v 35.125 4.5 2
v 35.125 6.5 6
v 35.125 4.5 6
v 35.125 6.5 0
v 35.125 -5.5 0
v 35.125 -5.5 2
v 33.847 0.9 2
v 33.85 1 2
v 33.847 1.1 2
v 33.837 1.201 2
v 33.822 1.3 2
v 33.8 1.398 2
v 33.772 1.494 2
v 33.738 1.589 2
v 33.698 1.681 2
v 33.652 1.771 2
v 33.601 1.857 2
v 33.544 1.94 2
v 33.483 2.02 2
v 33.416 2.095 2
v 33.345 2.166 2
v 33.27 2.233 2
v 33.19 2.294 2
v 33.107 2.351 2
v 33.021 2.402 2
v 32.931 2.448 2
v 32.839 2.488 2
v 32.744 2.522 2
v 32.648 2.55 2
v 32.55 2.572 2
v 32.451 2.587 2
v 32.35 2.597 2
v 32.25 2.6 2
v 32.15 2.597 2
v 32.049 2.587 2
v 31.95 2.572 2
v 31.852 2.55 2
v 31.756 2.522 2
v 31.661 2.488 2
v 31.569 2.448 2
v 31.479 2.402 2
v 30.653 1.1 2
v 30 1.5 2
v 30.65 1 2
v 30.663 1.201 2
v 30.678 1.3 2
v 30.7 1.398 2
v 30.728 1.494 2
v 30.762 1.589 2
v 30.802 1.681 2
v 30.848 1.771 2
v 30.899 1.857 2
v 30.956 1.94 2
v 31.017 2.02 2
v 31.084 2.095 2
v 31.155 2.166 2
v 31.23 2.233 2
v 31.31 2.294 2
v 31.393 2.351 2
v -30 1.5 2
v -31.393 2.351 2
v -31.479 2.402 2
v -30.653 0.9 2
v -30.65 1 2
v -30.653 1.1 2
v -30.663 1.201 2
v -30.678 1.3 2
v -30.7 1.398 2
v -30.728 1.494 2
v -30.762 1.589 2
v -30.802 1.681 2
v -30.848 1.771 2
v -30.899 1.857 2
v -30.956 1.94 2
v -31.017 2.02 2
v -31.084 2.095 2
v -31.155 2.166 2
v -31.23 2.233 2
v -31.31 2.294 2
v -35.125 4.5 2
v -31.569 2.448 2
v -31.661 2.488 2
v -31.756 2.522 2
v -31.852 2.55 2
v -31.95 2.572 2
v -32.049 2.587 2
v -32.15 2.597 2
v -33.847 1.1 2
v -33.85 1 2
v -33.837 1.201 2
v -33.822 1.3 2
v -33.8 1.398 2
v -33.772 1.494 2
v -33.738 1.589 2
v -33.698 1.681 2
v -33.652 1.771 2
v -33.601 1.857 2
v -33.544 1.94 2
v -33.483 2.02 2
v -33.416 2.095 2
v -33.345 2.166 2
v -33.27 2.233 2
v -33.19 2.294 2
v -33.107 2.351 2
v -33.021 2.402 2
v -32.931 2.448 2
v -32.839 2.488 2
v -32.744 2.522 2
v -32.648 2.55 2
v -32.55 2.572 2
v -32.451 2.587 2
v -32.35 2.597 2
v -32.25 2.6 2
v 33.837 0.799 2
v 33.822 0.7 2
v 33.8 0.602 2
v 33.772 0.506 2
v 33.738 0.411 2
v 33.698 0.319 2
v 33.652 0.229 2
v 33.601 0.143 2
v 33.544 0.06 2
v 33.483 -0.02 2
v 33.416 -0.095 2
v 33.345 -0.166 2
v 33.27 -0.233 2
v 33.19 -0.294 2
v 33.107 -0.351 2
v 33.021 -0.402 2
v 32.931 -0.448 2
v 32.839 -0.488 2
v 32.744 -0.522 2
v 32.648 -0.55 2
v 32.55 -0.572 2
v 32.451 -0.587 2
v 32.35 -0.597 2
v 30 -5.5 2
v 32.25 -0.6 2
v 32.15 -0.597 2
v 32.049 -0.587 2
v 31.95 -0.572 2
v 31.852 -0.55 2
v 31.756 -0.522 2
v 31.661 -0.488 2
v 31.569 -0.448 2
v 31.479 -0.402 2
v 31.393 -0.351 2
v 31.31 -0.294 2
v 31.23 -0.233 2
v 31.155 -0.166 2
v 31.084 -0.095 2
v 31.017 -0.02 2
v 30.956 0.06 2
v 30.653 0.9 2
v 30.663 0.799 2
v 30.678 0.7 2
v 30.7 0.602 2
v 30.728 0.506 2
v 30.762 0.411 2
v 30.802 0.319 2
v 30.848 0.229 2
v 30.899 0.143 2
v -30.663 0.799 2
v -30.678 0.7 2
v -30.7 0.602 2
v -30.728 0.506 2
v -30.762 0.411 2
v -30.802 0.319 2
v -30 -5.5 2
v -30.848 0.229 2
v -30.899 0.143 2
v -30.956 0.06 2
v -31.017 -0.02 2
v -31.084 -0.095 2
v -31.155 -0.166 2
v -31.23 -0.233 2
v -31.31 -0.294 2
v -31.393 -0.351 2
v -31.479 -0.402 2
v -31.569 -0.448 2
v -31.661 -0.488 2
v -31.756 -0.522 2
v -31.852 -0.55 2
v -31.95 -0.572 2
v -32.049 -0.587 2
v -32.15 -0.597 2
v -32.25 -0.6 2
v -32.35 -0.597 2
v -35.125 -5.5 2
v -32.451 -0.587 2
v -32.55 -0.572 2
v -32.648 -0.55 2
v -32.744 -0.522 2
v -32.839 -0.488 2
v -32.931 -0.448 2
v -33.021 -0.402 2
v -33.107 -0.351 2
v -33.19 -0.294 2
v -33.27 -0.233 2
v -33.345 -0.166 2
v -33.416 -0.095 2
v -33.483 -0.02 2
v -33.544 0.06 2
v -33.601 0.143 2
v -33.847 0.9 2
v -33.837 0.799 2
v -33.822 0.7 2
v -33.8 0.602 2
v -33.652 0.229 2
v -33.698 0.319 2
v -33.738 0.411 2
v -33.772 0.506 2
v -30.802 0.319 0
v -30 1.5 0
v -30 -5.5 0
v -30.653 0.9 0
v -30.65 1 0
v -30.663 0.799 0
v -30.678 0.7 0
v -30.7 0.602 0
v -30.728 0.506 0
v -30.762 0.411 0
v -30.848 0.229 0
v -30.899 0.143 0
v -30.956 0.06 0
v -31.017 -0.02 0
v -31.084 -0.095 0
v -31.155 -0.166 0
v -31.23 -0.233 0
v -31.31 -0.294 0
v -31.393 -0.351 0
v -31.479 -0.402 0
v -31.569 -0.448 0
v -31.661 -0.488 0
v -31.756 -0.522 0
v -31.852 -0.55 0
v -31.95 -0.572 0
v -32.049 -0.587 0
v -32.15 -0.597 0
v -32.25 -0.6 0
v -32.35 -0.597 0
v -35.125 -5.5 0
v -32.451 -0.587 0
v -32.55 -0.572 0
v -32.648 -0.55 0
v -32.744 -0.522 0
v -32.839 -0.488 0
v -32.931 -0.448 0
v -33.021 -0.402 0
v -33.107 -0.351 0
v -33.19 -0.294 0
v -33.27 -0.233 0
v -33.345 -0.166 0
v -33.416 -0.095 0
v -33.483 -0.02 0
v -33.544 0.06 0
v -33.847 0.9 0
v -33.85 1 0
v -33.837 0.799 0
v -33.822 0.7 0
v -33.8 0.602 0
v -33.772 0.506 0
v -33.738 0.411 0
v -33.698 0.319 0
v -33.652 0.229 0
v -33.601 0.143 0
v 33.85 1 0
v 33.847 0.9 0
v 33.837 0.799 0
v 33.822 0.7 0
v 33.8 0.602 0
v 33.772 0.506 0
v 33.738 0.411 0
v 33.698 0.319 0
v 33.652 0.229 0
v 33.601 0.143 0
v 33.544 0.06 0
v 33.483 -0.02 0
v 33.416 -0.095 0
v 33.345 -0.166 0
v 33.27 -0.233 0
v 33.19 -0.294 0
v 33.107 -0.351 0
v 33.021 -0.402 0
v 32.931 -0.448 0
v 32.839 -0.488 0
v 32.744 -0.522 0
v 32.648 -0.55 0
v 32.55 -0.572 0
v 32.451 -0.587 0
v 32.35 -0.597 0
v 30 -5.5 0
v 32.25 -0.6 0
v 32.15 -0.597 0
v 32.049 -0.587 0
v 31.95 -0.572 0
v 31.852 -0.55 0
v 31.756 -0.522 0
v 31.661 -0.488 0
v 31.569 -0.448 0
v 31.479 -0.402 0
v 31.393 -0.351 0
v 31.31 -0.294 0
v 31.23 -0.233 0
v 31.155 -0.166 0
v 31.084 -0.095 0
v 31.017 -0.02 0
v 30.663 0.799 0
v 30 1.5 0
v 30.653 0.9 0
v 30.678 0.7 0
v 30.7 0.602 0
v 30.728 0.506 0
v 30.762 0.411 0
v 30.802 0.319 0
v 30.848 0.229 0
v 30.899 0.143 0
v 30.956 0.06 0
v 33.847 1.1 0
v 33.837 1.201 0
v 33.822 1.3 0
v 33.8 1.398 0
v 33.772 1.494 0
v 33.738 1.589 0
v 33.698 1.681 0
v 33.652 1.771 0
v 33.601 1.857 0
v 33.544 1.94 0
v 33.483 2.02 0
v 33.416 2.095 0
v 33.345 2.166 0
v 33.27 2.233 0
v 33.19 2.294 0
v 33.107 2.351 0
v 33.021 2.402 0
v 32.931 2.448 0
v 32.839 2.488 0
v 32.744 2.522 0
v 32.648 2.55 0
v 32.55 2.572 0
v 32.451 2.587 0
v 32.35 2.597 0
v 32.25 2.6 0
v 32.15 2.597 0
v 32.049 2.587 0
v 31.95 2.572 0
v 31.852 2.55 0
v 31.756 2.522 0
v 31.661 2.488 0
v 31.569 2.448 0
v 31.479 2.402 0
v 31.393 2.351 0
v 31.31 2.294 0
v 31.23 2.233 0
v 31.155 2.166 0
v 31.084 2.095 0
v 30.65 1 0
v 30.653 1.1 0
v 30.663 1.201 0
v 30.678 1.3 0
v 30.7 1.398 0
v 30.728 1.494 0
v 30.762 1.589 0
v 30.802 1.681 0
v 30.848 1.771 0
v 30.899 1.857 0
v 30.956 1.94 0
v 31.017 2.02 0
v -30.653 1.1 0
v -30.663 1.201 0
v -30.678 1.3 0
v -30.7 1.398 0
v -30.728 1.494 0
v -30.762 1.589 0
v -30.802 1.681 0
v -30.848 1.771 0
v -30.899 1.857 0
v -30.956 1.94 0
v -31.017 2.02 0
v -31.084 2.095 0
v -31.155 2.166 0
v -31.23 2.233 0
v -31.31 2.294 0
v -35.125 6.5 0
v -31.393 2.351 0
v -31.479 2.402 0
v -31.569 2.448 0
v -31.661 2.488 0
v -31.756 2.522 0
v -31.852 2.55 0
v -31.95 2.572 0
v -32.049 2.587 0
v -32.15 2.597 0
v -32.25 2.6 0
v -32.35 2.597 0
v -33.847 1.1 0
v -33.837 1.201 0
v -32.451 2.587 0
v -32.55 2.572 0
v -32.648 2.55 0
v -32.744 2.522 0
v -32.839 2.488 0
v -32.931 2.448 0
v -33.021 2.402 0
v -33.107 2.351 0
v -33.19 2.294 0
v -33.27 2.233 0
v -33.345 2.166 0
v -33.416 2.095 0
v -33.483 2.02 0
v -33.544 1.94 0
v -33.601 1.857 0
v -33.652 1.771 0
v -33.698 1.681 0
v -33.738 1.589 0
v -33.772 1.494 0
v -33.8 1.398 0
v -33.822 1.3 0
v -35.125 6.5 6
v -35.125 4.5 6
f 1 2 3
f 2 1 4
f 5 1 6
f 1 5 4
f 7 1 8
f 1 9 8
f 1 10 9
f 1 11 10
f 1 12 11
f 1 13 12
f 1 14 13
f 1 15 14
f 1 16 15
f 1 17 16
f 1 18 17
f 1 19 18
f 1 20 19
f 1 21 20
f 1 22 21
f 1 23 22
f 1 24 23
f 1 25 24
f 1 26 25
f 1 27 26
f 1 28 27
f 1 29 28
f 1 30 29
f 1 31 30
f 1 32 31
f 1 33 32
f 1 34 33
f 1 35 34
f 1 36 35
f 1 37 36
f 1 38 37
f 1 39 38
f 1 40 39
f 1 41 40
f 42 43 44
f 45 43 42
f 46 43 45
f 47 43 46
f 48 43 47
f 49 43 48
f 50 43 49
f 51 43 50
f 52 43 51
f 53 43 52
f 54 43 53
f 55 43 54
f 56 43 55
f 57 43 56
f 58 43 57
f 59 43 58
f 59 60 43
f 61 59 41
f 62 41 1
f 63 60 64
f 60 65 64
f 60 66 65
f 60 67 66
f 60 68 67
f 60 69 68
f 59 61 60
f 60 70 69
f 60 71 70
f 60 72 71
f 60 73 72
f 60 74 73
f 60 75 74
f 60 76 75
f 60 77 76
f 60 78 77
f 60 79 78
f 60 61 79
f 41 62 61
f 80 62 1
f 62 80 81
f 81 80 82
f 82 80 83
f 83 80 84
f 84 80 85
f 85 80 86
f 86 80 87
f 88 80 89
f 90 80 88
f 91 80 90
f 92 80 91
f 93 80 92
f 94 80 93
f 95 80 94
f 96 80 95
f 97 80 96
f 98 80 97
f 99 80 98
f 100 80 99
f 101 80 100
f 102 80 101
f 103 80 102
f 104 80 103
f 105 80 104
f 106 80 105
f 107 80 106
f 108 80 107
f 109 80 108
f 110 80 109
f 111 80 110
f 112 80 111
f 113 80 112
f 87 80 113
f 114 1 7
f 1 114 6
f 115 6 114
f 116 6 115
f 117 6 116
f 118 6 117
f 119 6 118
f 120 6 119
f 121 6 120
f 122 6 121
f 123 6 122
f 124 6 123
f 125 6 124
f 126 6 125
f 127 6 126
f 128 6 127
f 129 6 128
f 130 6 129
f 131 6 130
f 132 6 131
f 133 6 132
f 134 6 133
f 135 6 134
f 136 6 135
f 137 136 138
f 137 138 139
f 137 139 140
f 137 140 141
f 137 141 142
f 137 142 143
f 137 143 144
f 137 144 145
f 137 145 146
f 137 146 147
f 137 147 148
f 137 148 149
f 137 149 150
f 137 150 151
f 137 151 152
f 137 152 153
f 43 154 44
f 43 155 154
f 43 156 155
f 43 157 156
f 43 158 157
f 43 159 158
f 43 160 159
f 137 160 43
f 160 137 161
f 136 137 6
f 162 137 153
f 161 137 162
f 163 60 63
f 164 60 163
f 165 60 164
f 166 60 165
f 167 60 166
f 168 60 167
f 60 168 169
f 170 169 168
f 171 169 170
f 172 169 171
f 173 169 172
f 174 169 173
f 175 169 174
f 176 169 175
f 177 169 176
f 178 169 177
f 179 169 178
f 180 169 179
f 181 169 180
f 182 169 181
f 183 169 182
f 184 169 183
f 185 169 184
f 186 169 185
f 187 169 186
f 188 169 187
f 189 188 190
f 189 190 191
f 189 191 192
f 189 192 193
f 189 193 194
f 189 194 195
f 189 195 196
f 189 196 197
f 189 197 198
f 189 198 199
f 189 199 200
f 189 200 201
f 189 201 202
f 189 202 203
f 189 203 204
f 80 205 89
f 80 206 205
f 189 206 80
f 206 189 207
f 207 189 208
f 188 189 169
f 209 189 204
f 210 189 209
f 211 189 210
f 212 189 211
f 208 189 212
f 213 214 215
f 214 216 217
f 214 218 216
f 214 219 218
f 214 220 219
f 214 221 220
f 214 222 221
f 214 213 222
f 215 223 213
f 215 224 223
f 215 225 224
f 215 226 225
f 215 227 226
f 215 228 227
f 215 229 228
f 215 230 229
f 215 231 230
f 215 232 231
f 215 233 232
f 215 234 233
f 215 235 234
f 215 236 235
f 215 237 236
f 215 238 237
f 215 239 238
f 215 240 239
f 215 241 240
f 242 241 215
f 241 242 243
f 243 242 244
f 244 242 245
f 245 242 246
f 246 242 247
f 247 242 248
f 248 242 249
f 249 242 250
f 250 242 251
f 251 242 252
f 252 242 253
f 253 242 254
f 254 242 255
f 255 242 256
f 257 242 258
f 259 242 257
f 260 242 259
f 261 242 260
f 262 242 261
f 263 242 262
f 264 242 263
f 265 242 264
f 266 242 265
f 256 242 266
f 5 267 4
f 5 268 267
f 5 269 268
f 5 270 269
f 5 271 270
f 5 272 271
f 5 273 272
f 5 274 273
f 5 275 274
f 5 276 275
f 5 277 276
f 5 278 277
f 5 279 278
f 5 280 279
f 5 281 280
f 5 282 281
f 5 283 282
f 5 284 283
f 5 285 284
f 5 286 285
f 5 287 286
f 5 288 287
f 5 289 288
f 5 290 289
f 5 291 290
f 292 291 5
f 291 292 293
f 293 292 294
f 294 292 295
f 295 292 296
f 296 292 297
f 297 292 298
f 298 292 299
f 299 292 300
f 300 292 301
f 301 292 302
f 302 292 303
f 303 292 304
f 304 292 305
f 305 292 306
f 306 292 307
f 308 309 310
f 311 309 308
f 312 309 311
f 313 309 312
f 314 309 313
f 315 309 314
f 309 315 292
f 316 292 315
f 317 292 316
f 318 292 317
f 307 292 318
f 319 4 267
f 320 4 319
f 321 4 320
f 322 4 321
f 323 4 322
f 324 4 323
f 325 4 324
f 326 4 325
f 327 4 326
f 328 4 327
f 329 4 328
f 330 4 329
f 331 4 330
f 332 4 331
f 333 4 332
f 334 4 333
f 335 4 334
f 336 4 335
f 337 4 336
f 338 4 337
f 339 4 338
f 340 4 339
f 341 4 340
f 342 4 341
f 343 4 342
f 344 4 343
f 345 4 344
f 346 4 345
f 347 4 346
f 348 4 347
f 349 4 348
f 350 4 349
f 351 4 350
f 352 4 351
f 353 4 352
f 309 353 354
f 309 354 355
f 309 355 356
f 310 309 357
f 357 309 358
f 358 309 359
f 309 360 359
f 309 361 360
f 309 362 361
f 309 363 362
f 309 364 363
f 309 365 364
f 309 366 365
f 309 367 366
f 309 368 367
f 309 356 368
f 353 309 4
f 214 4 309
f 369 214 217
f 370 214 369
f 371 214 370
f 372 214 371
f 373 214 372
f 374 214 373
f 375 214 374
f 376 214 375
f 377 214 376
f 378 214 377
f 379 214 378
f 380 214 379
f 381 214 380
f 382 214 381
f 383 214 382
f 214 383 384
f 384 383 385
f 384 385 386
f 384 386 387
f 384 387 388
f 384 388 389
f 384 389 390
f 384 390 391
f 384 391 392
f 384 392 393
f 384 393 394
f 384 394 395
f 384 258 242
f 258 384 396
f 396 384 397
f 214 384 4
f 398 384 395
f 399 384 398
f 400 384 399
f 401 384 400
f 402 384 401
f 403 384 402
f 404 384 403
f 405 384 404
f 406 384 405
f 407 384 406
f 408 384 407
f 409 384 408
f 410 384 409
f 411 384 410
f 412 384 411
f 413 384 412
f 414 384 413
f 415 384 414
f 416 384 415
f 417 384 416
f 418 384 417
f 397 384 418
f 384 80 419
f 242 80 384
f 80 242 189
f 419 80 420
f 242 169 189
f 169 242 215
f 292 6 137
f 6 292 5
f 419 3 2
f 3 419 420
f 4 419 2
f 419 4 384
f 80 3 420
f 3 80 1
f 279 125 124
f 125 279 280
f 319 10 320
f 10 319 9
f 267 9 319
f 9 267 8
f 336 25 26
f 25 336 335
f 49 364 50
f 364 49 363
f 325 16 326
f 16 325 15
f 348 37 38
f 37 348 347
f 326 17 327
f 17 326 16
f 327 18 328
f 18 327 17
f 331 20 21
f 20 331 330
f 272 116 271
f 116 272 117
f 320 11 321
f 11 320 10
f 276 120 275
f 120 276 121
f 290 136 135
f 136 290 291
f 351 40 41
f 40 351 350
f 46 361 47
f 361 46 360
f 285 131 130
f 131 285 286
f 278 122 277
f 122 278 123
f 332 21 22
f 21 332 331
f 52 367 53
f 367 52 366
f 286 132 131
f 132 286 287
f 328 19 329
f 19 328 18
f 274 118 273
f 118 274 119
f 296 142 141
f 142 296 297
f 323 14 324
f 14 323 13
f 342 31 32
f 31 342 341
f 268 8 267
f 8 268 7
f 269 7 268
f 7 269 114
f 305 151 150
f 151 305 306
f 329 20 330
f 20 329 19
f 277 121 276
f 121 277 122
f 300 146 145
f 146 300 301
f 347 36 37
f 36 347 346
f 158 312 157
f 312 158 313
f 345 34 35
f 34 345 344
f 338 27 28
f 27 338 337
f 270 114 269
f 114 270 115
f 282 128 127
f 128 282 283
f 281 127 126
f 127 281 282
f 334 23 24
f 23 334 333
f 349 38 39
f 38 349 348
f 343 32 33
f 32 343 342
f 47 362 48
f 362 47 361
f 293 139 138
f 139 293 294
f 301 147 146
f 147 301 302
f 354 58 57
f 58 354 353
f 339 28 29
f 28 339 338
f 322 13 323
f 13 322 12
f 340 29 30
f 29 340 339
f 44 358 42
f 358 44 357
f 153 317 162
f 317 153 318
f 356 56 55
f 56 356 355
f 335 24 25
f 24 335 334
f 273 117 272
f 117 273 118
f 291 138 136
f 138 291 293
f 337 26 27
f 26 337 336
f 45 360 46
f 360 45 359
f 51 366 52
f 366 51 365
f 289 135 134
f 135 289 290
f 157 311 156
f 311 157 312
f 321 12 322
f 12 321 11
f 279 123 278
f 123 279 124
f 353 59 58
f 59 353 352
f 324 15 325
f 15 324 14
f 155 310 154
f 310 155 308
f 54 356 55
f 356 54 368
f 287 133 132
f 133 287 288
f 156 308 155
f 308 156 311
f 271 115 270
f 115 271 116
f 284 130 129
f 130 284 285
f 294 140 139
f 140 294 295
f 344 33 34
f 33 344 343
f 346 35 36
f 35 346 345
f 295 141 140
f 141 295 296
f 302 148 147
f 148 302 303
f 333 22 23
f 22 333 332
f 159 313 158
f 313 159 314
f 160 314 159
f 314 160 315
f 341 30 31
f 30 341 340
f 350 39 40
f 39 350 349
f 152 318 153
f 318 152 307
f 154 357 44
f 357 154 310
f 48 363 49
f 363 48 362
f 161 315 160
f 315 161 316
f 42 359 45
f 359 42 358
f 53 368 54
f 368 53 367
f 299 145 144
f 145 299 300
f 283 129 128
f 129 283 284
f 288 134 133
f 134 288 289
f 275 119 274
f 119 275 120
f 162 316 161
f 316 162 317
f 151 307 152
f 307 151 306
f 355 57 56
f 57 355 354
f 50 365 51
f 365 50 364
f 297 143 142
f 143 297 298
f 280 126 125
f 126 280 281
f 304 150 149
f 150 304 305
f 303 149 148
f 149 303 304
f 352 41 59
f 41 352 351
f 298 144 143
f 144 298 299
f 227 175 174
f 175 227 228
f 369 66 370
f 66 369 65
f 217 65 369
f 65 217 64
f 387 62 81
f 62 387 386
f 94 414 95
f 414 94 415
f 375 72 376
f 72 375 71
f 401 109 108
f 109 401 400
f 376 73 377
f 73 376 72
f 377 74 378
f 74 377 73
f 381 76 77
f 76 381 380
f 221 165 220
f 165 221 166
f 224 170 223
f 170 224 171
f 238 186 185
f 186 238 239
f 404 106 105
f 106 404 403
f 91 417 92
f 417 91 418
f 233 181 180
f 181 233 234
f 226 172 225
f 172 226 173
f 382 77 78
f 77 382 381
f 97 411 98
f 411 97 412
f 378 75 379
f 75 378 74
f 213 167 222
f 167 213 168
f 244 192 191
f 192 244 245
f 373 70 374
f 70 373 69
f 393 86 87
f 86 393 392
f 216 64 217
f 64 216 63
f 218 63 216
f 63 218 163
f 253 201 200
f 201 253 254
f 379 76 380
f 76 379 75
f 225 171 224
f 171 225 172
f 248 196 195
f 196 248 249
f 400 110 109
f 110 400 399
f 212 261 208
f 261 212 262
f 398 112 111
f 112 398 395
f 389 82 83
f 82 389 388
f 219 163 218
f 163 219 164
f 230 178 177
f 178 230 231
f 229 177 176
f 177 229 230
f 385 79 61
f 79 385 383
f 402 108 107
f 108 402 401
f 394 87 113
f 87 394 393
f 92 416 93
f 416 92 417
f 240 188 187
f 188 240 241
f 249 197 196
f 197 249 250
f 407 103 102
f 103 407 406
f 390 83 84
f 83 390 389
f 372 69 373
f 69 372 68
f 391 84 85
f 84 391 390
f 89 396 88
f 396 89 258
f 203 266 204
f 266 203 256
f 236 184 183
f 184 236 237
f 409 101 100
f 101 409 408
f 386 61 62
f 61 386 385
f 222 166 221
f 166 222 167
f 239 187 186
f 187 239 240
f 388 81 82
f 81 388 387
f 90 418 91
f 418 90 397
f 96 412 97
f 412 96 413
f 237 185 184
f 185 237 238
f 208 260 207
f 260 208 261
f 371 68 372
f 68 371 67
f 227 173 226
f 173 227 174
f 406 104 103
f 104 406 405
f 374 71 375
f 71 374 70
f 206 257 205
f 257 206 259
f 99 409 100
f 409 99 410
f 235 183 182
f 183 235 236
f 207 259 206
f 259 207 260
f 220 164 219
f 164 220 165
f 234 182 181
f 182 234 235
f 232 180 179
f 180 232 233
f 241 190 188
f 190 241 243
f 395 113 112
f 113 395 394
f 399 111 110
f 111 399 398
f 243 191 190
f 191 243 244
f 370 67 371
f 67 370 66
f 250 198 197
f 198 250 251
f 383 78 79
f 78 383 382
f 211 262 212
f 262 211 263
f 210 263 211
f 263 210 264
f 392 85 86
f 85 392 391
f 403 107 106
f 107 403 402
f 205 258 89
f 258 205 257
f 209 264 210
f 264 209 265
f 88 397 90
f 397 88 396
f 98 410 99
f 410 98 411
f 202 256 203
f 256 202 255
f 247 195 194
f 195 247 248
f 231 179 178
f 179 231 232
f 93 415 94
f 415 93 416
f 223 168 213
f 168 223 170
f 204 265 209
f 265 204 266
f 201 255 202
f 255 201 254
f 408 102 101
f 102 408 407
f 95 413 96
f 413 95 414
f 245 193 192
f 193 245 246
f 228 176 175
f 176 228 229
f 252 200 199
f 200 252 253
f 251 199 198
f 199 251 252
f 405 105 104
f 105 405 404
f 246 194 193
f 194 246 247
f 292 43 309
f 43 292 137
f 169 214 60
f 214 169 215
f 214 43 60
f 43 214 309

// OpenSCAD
// file: ../library_deh/mag_mount.scad
/* mag_mount.scad

 * ****** Stud magnets ******
16 mm 
http://www.kjmagnetics.com/proddetail.asp?prod=MM-C-16
    Dimensions:
        D=16mm (0.63")
        M=4mm (0.16") (M4 Coarse Male threaded stud)
        H=13mm (0.51")
        h=5mm (0.20")
    Material: NdFeB, Grade N38
    Plating/Coating: Ni-Cu-Ni (Nickel)
    Magnetization Direction: Axial (Poles on Flat Ends)
    Weight: 0.26 oz. (7.37 g)
    Pull Force: 12.1 lbs
    Surface Field: N/A
    Brmax: 12,600 Gauss
    BHmax: 38 MGOe
   $2.49
*/
// Measured dimensions -- 16 mm ** M3 ** stud (default)
 mag_thick = 4.82;	    // Magnet thickness (base to shell top)
 mag_shell_dia = 16.0;	    // Magnet shell OD
 mag_shell_flat_dia = 11;   // Dia of flat of magnet
 mag_stud_dia = 2.8;        // Dia of mounting magnet studs (4-40)
 mag_stud_len = 8.0;        // Height of stud from magnet back
 mag_washer_thick = 1.1;    // Thickness of washer
 mag_nut_thick = 2.4;       // Stud nut (M3) thickness
 mag_nut_hex_flat = 5.41;   // Nut across flats
 mag_nut_hex_peak = 6.20;   // Nut across peaks (also dia of nut)
 mag_washer_dia = 7.1; // 9.5;// Diameter of washer for magnet stud
 mag_washer_dia_extra = 2;  // Washer slop

// Measured dimensions 16 mm -- ** M4 ** stud
 mag16_M4_thick = 5.21;	     // Magnet thickness (base to shell top)
 mag16_M4_shell_dia = 16.0;	     // Magnet shell OD
 mag16_M4_shell_flat_dia = 11.7;  // Dia of flat of magnet
 mag16_M4_stud_dia = 3.64;        // Dia of mounting magnet studs (M4)
 mag16_M4_stud_len = 8.18;        // Height of stud from magnet back
 mag16_M4_nut_thick = 2.98;       // Stud nut (M4) thickness
 mag16_M4_nut_hex_flat = 6.85;    // Nut across flats
 mag16_M4_nut_hex_peak = 7.89;    // Nut across peaks (also dia of nut)
 mag16_M4_washer_thick = 0.85;    // Thickness of washer
 mag16_M4_washer_dia = 8.68;      // Diameter of washer for magnet stud
 mag16_M4_washer_inner_dia = 5.3; // Washer hole diameter
 mag16_M4_washer_dia_extra = 0.5; // Washer slop


/*
http://www.kjmagnetics.com/proddetail.asp?prod=MM-C-20
    Dimensions:
        D=20mm (0.79")
        M=4mm (0.16") (M4 Coarse Male threaded stud)
        H=15mm (0.59")
        h=7mm (0.28")
    Material: NdFeB, Grade N38
    Plating/Coating: Ni-Cu-Ni (Nickel)
    Magnetization Direction: Axial (Poles on Flat Ends)
    Weight: 0.53 oz. (15.0 g)
    Pull Force: 28.7 lbs
    Surface Field: N/A
    Brmax: 12,600 Gauss
    BHmax: 38 MGOe

  $3.14
*/
 mag20_thick = 7.11;	       // Magnet thickness (base to shell top)
 mag20_shell_flat_dia = 20.2;  // Magnet shell OD
 mag20_stud_dia = 3.75;        // Dia of mounting magnet stud at base
 mag20_stud_len = 7.75;        // Height of stud from magnet back
 mag20_washer_thick = 0.85;    // Thickness of washer
 mag20_nut_thick = 2.93;       // Nut for stud thickness
 mag20_nut_hex_peak = 7.89; // Nut across peaks (also dia of nut)
 mag20_washer_dia = 8.68;      // Diameter of washer for magnet stud
 mag20_washer_dia_extra = 0.5; // Washer slop

/*
http://www.kjmagnetics.com/proddetail.asp?prod=MM-C-25

    Dimensions:
        D=25mm (0.98")
        M=5mm (0.20") (M5 Coarse Male threaded stud)
        H=17mm (0.67")
        h=8mm (0.32")
    Material: NdFeB, Grade N38
    Plating/Coating: Ni-Cu-Ni (Nickel)
    Magnetization Direction: Axial (Poles on Flat Ends)
    Weight: 0.92 oz. (26.1 g)
    Pull Force: 48.5 lbs
    Surface Field: N/A
    Brmax: 12,600 Gauss
    BHmax: 38 MGOe
  $4.20
*/
// 25 mm M5
 mag25_thick = 7.75;	      // Magnet thickness (base to shell top)
 mag25_shell_dia = 25.17;     // Magnet shell OD
 mag25_shell_flat_dia = 20;   // Dia of flat of magent
 mag25_stud_dia = 4.82;       // Dia of mounting magnet studs (M5)
 mag25_stud_len = 9.3;        // Height of stud from magnet back
 mag25_washer_thick = 0.97;   // Thickness of washer
 mag25_nut_thick = 3.96;      // M5 Nut for stud thickness
 mag25_nut_hex_flat = 7.93;   // M5 nut across flats
 mag25_nut_hex_peak = 9.16;   // M5 nut across peaks (also dia of nut)
 mag25_washer_dia = 9.8;      // Washer diameter of washer for magnet stud
 mag25_washer_inner_dia = 5.3;// Washer hole diameter
 mag25_washer_dia_extra = 0.5;  // Washer slop

// Cylindrical magnets
mag_cyl_dia = 6.5; 
mag_cyl_ht = 5.05;
// file: ../library_deh/ridged_screw_hole.scad
/*
file: ridged_screw_hole.scad
2018 01 18
*/
/*
All results are translated so that inside edges of the ridges are aligned with the axis, so a 
square or rectangle will have the corner centered on the x,y origin.

Modules----
module ridged_rectangle(xlen,ylen,zlen,rht,rwdy)
module corner_ridged_rectangle(xlen,ylen,zlen,rht,rwdx,rwdy)
module corner_ridged_square(slen,zlen,rht,rwds)
module corner_ridged_square_w_screw(slen,zlen,rht,rwds,scd1,scd2,sch,scofx,scofy)
module corner_ridged_rectangle_w_screw(xlen,ylen,zlen,rht,rwdx,rwdy,scd1,scd2,sch,scofx,scofy)
module ridged_rectangular_w_clip(xlen,ylen,zlen,rht,rwdy,clen)
*/

include <deh_shapes.scad>

/*  ***** ridged_rectangle *****
* xlen = x axis direction length
* ylen = y axis direction length
* zlen = z axis, height to ledge
* rht  = ridge thickness
* rwdy = ridge width, y direction
* NOTE: to convert from right orientation use
* mirror([1,0,0]) for left orientation
*/
module ridged_rectangle(xlen,ylen,zlen,rht,rwdy)
{
	corner_ridged_rectangle(xlen,ylen,zlen,rht,0,rwdy);
}

/*  ***** corner_ridged_rectangle *****
* xlen = x axis direction length
* ylen = y axis direction length
* zlen = z axis, height to ledge
* rht  = ridge thickness
* rwdx = ridge width, x direction
* rwdy = ridge width, y direction
*/
module corner_ridged_rectangle(xlen,ylen,zlen,rht,rwdx,rwdy)
{
    cx = rwdx; cy = -rwdy;
    translate([-cx,cy,0])
    {
        difference()
        {
            union()
            {
                zht1 = (zlen+rht);
                cube([xlen,ylen,zht1],center=false);
            }
            union()
            {
                zht2 = rht+0.1;
                translate([rwdx,rwdy,zlen])
                    cube([xlen,ylen,zht2],center=false);
            }
        }
    }        
}

/*  ***** corner_ridged_square_w_screw *****
* slen = length x & y axis directions
* zlen = z axis, height to ledge
* rht  = ridge thickness
* rwds = ridge width, x & y directions
*/
module corner_ridged_square(slen,zlen,rht,rwds)
{
    corner_ridged_rectangle(slen,slen,zlen,rht,rwds,rwds);
}

/*  ***** corner_ridged_square_w_screw *****
* slen = length x & y axis directions
* zlen = z axis, height to ledge
* rht  = ridge thickness
* rwds = ridge width, x & y directions
* scd1 = screw diameter at top
* scd2 = screw diameter at bottom of screw
* sch  = screw hole height
* scofx = screw hole center offset from inside ridge corner, x
* scofy = screw hole center offset from inside ridge corner, y
*/
        //corner_ridged_square_w_screw(  10,  5, 1.5,  4,  3.2,  1.2,  3,  -1.4,  -1.4  ); // test
module corner_ridged_square_w_screw(slen,zlen,rht,rwds,scd1,scd2,sch,scofx,scofy)
{
    difference()
    {
        corner_ridged_square(slen,zlen,rht,rwds);
        
        translate([0,0,zlen-sch+rht+.01])
            ridge_screw_hole_square(slen,rwds,rwds,scd1,scd2,sch,scofx,scofy);
    }
}

/*  ***** corner_ridged_rectangle_w_screw *****
* xlen = x axis direction length
* ylen = y axis direction length
* zlen = z axis, height to ledge
* rht  = ridge thickness
* rwdx = ridge width, x directions
* rwdy = ridge width, y directions
* scd1 = screw diameter at top
* scd2 = screw diameter at bottom of screw
* sch  = screw hole height
* scofx = screw hole center offset from inside ridge corner, x
* scofy = screw hole center offset from inside ridge corner, y
*/
//translate([20,0,0])
//                                xlen ylen zlen rht dx dy   scd1 scd2  sch  scofx scofy
//corner_ridged_rectangle_w_screw(6,  12,    5, 1.5, 5, 4,    3.2, 2.2,   4,  -1.5,  -2.0); // Test right
//translate([-6,0,0])
//corner_ridged_rectangle_w_screw(6,  12,    5, 1.5, -3, 4,    3.2, 2.2,   4,  -1.5+6,  -2.0); // Test left
module corner_ridged_rectangle_w_screw(xlen,ylen,zlen,rht,rwdx,rwdy,scd1,scd2,sch,scofx,scofy)
{
    difference()
    {
        corner_ridged_rectangle(xlen,ylen,zlen,rht,rwdx,rwdy);
        
        translate([0,0,zlen-sch+rht+.01])
            ridge_screw_hole_rectangle(xlen,ylen,rwdx,rwdy,scd1,scd2,sch,scofx,scofy);
    }
}
/*
* xlen = x axis direction length
* ylen = y axis direction length
* rwdx = ridge width, x directions
* rwdy = ridge width, y directions
* scd1 = screw diameter at top
* scd2 = screw diameter at bottom of screw
* sch  = screw hole height
* scofx = screw hole center offset, x
* scofy = screw hole center offset, y
*/
module ridge_screw_hole_rectangle(xlen,ylen,rwdx,rwdy,scd1,scd2,sch,scofx,scofy)
{
    hx =  scofx;
    hy =   scofy;
//echo("R","rwdx",rwdx,"rwdy",rwdy);
//echo("R","scofx",scofx,"scofy",scofy,"hy",hy,"hx",hx);
    translate([hx,hy,0])
        cylinder(d1=scd2,d2=scd1,h=sch,center=false,$fn=25);    
}

module ridge_screw_hole_square(slen,rwdx,rwdy,scd1,scd2,sch,scofx,scofy)
{
    ridge_screw_hole_rectangle(slen,slen,rwdx,rwdy,scd1,scd2,sch,scofx,scofy);
}

/*
pst_ldg = 6 + bfthick;	// Height of pc board ledge from bottom
pst_wid = 3;	// Width of post
pcb_thick = 2.0;	// Thickness of pcb
clip_ht = 3;
pst_w2 = 1;	// Width where pcb contacts edge
*/

/*  ***** ridged_rectangular_w_clip *****
* xlen = x axis direction length
* ylen = y axis direction length
* zlen = z axis, height to ledge
* rht  = height of ridge (pcb thickness)
* rwdy = ridge width, y direction
* clen = clip length
* Orientation: ridge runs in y-axis direction 
* Note: ledge with is (xlen - rwdy)
*/
//         ridged_rectangular_w_clip(  3,  15,   5, 1.5, 1,   3 );	// Test
module ridged_rectangular_w_clip(xlen,ylen,zlen,rht,rwdy,clen)
{
	corner_ridged_rectangle(xlen,ylen,zlen,rht,rwdy,0);

	// Clip overhang
	cofsx = clen - rwdy;	// Offsets for wedge
 	cofsy = ylen;
	cofsz = zlen+rht+clen - rwdy;
	translate([cofsx,cofsy,cofsz])
		rotate([0,180,0])
		rotate([0,0,-90])
		wedge(ylen,clen,clen);

}
// file: ../library_deh/fasteners.scad
/* ***** fasteners.scad *****
 * library of measurements of 
 *   screws, washers, etc.
 * date: 20170512
*/

// 6-32
screw_dia_s632 = 3.35;	// shaft diameter
screw_dia_ph632 = 6.62;	// pan-head diameter
screw_dia_pht632 = 2.2;	// pan-head thickness
nut_dia_632 = 8.77 ;	// peak-peak 
nut_thick_632 = 2.77;	// thickess

// 4-40
screw_dia_s440 = 2.72;	// shaft diameter
screw_dia_s440_z = 1.90; // Dia at tip
screw_dia_ph = 5.42;	// pan-head diamter
screw_dia_pht = 1.7;	// pan-head thickness
nut_dia_440 =  7.12;	// peak-peak
nut_thick_440 = 2.41;	// thickess
nut_dia_440L = 8.88;	// Lock nut diameter
nut_thick_440L = 4.6;	// Lock nut thickness

// 6-20 self-tap
screw_dia_sod620 = 3.5;	// Outer diameter of threads
screw_dia_sth620 = 2.6;	// Self tap hole
screw_dia_pht = 6.7;	// pan-head diameter

// #4
washer_od_4 = 8.0;		// Washer outer diameter
washer_id_4 = 3.2;		// Washer inner diameter
washer_thick_4 = .94;	// Washer thickness

// #6
washer_od_6 = 9.46;	// Washer outer diameter	
washer_id_6 = 4.04;	// Washer inner diameter
washer_thick = 1.04;	// Washer thickness
washer_thick_6 = 1.04;	// Washer thickness

// M3
nut_dia_M3 = 6.5; 
nut_flat_M3 = 5.43;
nut_thick_M3 = 2.29;
washer_od_M3 = 6.9;	// Washer outside diameter
washer_id_M3 = 3.22;	// Washer inside (hole) diameter
washer_thick_M3 = .57;	// Washer thickness

// M4
nut_dia_M4 = 7.86;
nut_flat_M4 = 6.75;
nut_thick_M4 = 2.96;
// file: ../library_deh/Plano_frame.scad
/* File: Plano_frame.scad
 * Plano enclosure PC board fame
 * Author: deh
 * Latest edit: 201700701
 */

include <mag_mount.scad>

 $fn=100;
 
 // Inside dimensions of Plano box
 plano_len          = 152.5;   // flat-flat
 plano_wid          =  76.0;   // flat-flat

base_len = plano_len;
base_wid = plano_wid;
base_ht  = 3.2;		// Thickness of base plate
base_rnd = 10;	// Base plate corner rounding radius
 
 // Stud magnet relative postions.
 // Bottom magnet is on center-line and x,y reference is 0,0
 plano_mag_top_x  = 30.5;   // Top pair x +/- from center-line (C/L)
 plano_mag_top_y  = 138.69; // Top pair y from bottom magnet hole
 plano_mag_top_ofs = 8;    // Top mags to top edge of PC board max
 // Bottom mag distance from bottom of plano wall
 plano_mag_bot_ofs = plano_len - plano_mag_top_ofs - plano_mag_top_y;
 
 
 plano_offs_mag_y   = 4;    // Offset from edge for magnet hole
 plano_offs_mag_x   = 4;    // Offset from edge for magnet hole
 plano_ctr_y    = (plano_len/2);
 plano_ctr_x    = (plano_wid/2);
  
 plano_mag_stud = mag_stud_dia;  // Dia of mounting magnet studs (4-40)
 plano_mag_stud_len = mag_stud_len; // Height of stud from magnet back
 mag_washer_dia = 9.5;      // Diameter of washer for magnet stud
 mag_washer_thick = 1.1;    // Thickness of washer
 mag_washer_dia_extra = 1;  // Washer slop
 plano_web_thick = 2;   // Plano box thickness where stud is 
 mag_wash_recess_dia = mag_washer_dia + mag_washer_dia_extra;

 // Thickness of base for washer recess
 mag_stud_z = (mag_washer_thick +mag_nut_thick + plano_web_thick);
 mag_wash_recess_z = plano_mag_stud_len - mag_stud_z;    

 // Diameter of recess
 mag_wash_recess_dia = mag_washer_dia + mag_washer_dia_extra;

 // POD board
 pod_wid = 76.0;  // Overall width
 pod_len = 89.4;  // Overall length

// Discovery board
 dis_wid = 65.4;  // Overall width
 dis_len = 95.8;  // Overall length
 
// RJ45 connector on POD board
 RJ_offset=24.8; // Side of RJ45 jack from edge
 RJ_wid=15;      // Width of RJ 45 jack
 RJ_depth=14.5;  // Bottom of POD pc board edge to bottom/back of RJ45
 RJ_length=14;  // Front-Back length

// Cutout in base for RJ45 with plug
 RJ_slop = 4;
 RJ_plug_len = 14; // RJ plug protrudes beyond jack
 RJ_cutout_width = RJ_wid + RJ_slop;
 RJ_cutout_length = RJ_length + RJ_slop + RJ_plug_len;
 RJ_cutout_ofs = pod_wid/2 - (RJ_offset + RJ_wid);
 
 // CAN sub-board module
 sub_wid      = 33.75;  // Overall width
 sub_len      = 62.9;   // Overall lengh
 sub_mtg_wid  = 26.6;   // Between mounting holes, width
 sub_mtg_len  = 57.0;   // Between mounting holes, length 

 // Switcher module
 sw_wid =   20.3;   // Overall width
 sw_len =   41.2;   // Overall length
 sw_mtg_off_out_y   = 5.56; // Offset from edge "out" mounting hole 
 sw_mtg_off_out_x   = 2.7;  // Offset from edge "out" mounting hole 
 sw_mtg_off_in_y    = 3.1;  // Offset from edge "in" mounting hole
 sw_mtg_off_in_x    = 6.0;  // Offset from edge "in" mounting hole
 
 // RJ jack (load-cell jack)
 rj_grv =  4.0;  // Groove Depth 
 rj_ht  = 14.2;  // Groove Length
 rj_wid = 14.2;  // Groove Height
 
 // Post ridge
 p_ridge = 1.5; // Height of ridge to position PC board on post
 p_offset = 2;  // Offset of ridge from edge of post
 
 // Pod post
 pod_post_ht = (RJ_depth + 1);
 pod_post_y = 9;    // Length in "y" (long/length) box direction)
 pod_post_x = 6;    // Length in "x" (short/width) box direction)
 pod_post_q = 2.0;  // Width of ridge
 pod_post_s = 2.5;    // Screw hole dia
 pod_post_sd = 5;   // Screw hole depth

 // Pod board clip
 pcwide = 4;        // Width of clip post
 pcleng = 50;       // X axis direction length
 pc_y = base_len;   // y positioning

 iso_len   = 50.2;	// Length: two RJ 45 jacks parallel
 iso_wid   = 46.3;      // Width
 iso_thick = 1.6;	// PC board thickness
 iso_slop  = 0.0;	// Allowance for board variation
 iso_lip   = 1.2;	// Ledge width for board seating
 iso_ridge_ht = 1.55;	// Ridge ht for seat
 iso_ridge_wid= 1.5;	// Ridge width for seat
 iso_post_ht = 3.6;//6.0;	// Height of lip above base

 iso_osd_y = iso_wid + iso_slop - 0.5; // Board y
 iso_osd_x = iso_len + iso_slop - 0.5; // Board x
 iso_side  = iso_lip + iso_ridge_wid;
// file: ../library_deh/deh_shapes.scad
/* **** deh_shapes.scad *****
   * Library of useful shapes
   * 20170512
*/

/*  ***** tubedeh *****
d1 = outside diameter
d2 = inside diameter
ht = height
module tubedeh(d1,d2,ht)
reference is center of tube, bottom
*/

module tubedeh(d1,d2,ht)
{
   difference()
   {
     cylinder(d = d1, h = ht, center = false);
     cylinder(d = d2, h = ht + .001, center = false);
   }
}
/* ***** rounded_bar *****
 * rectangular bar with rounded end
bar with one end rounded
rounded_bar(d, l, h)
d = diameter of rounded end, and width of bar
l = length of bar from center of rounded end to end
h = thickness (height) of bar
reference is center of rounded end, bottom
*/
module rounded_bar(d, l, h)
{
    // Rounded end
    cylinder(d = d, h = h, center = false);
    // Bar
    translate([0, -d/2, 0])
       cube([l, d, h],false);
}
/* ***** eyebar *****
 * rounded bar with hole in rounded end
 * module eye_bar(d1, d2, len, ht)
d1 = outside diameter of rounded end, and width of bar
d2 = diameter of hole in end of bar
*/
module eye_bar(d1, d2, len, ht)
{
   difference()
   {   
      rounded_bar(d1,len,ht);
      cylinder(d = d2, h = ht + .001, center = false);
   }
}
/* ***** rounded_rectangle ******
rounded_rectangle(l,w,h,rad);
l = length (x direction)
w = width (y direction)
h = thickness (z direction)
rad = radius of corners
reference = center of rectangle x,y, bottom
*/
module rounded_rectangle(l,w,h,rad)
{
  translate([-(l-rad)/2,-(w-rad)/2,0])
  {
    // Four rounded edges
    translate([0,0,0])
      rounded_bar(rad*2,l-rad,h);
    translate([l-rad,0,0])
      rotate([0,0,90])
      rounded_bar(rad*2,w-rad,h);
    translate([l-rad,w-rad,0])
      rotate([0,0,180])
      rounded_bar(rad*2,l-rad,h);
    translate([0,w-rad,0])
      rotate([0,0,-90])
      rounded_bar(rad*2,w-rad,h);
    // Fill in center
    translate([0,0,0])
      cube([l-rad + .01,w-rad + .01,h],false);
  }
}

/* ***** rounded rim *****
module rounded_rim(l,w,h,rad,tk);
l = length (inside, x direction)
w = width (inside, y direction)
h = thickness (z direction)
rad = radius of corners
tk = thickness of rim wall
*/
module rounded_rim(l,w,h,rad,tk)
{
  difference()
  {
    rounded_rectangle(l+2*tk,w+2*tk,h,rad);
    rounded_rectangle(l, w, h, rad);
  }
}

/* ***** wedge *****
 * l = length
 * w = width
 * h = height/thickness
 * wedge(l, w, h)
*/
 module wedge(l, w, h)
 {
   polyhedron(
      points=[[0,0,0], [l,0,0], [l,w,0], [0,w,0], [0,w,h], [l,w,h]],
       faces=[[0,1,2,3],[5,4,3,2],[0,4,5,1],[0,3,4],[5,2,1]] );
 }
/* **** wedge_isoceles) ****
 * l - z axis length
 * w - y axis length 
 * h - x axis length
 * reference: [0, w/2, 0]
 * wedge_isoceles(l, w, h);
 */

module wedge_isoceles(l, w, h)
 {
  translate([0,0,l])
   rotate([0,90,0])
    translate([0,-w/2,0])
     polyhedron(
      points=[[0,0,0], [l,0,0], [l,w,0], [0,w,0], [0,w/2,h], [l,w/2,h]],
       faces=[[0,1,2,3],[5,4,3,2],[0,4,5,1],[0,3,4],[5,2,1]] );
 }
/* ***** rounded_triangle *****
 * l1 = side 1
 * l2 = side 2
 * l3 = side 3
 * h  = height/thickness
 * rad = radius of rounded corners
 */
module rounded_triangle(l1,l2,l3,h,rad)
{
  // Compute rotation angles
  al3 = acos((l1*l1 + l2*l2 - l3*l3)/(2 * l1 * l2));
  al1 = acos((l2*l2 + l3*l3 - l1*l1)/(2 * l2 * l3));
  al2 = acos((l3*l3 + l1*l1 - l2*l2)/(2 * l3 * l1));
  // Setup bars for edges
  translate([0,0,0])
    rotate([0,0,0])
      rounded_bar(rad,l3,h);
  translate([l3,0,0])
    rotate([0,0,180-al2])
      rounded_bar(rad,l1,h);
  rotate([0,0,al1])
    translate([l2,0,0])
      rotate([0,0,180])
        rounded_bar(rad,l2,h);
  // Fill in center
    triangle(l1,l2,l3,h);
}
/* ***** triangle *****
 * l1 = side 1
 * l2 = side 2
 * l3 = side 3
 * h  = height/thickness
 * triangle(l1,l2,l3,h);
 */
module triangle(l1,l2,l3,h)
{
  // Compute rotation angle
  al1 = acos((l2*l2 + l3*l3 - l1*l1)/(2 * l2 * l3));
  
  linear_extrude(height = h)
  polygon(points = [[0,0],[l3,0],[l2*cos(al1),l2*sin(al1)]]);
}
/* ***** chamfered hole *****
 * Punch hole with chamfer on one end
 * d1 = main hole diameter
 * d2 = hole diameter at chamfered end
 * ht1 = height of whole hole
 * ht2 = depth of  chamfer
*/
module chamfered_hole(d1,d2,ht1,ht2)
{
   rotate_extrude(convexity = 10)
     polygon(points = [[0,0],[d1/2,0],[d1/2,ht1-ht2],[d2/2,ht1],[0,ht1]]);

}

/* ***** fillet *****
 * r = radius of fillet
 * l = length of fillet
 fillet (r,l);
*/
module fillet(r,l)
{
   difference()
   {
     union()
     {
       cube([2*r,2*r,l]);
     }
     union()
     {
       translate ([r,r,0])
           cylinder(d = 2*r + 0.1, h = l, center = false);
       translate([r,0,0])
           cube([r,2*r,l],center = false);
       translate([0,r,0])
           cube([2*r,r,l],center = false);
     }
   }
}
/* ***** circular chamfer *****
 * d = outer diameter
 * rad = chamfer radius
 * circular_chamfer(d, rad);
*/
module circular_chamfer(d, rad)
{
  ofs = (d/2 - rad);
  rotate_extrude()
  translate([ofs,0])
   difference()
   {
     union()
     {
       square(size = [rad, rad]);
     }
     union()
     {
       translate ([0,rad ])
           circle(d = 2*rad + 0.1);
     }
   }
}
module circular_inner_chamfer(d, rad)
{
  circular_chamfer(d, rad);
} 

/* ***** circular chamfer *****
 * d = inner diameter
 * rad = chamfer radius
 * circular_chamfer(d, rad);
*/
module circular_outer_chamfer(d, rad)
{
  ofs = (d/2 - rad);
  rotate_extrude()
  translate([ofs,0])
   difference()
   {
     union()
     {
       square(size = [rad, rad]);
     }
     union()
     {
       translate ([rad,rad ])
           circle(d = 2*rad + 0.1);
     }
   }
}
// main file
/* File: F4g_cap.scad
 * Hold-down cap for Plano_F4gate.scad
 * Author: deh
 * Latest edit: 20180123
 */

include <../library_deh/deh_shapes.scad>
include <../library_deh/Plano_frame.scad>
include <../library_deh/fasteners.scad>
include <../library_deh/ridged_screw_hole.scad>

 $fn=100;

big = 10;	// Big z in direction 

bb_wid = 11;
bb_len = 70.25;
bb_cut = 6.5;
bb_hole = 64.5;    // Hole spacing
bb_thk  = 2;    // Thickness
st_wid = 6;
cc_y = 60;

module base_bar()
{
    translate([0,0,bb_thk/2])
        cube([bb_len,bb_wid,bb_thk], center= true);
    
    translate([0,bb_wid/2,st_wid/2])
        cube([bb_len,bb_thk,st_wid],center=true);
}
module cut_outs()
{
    wy = 1;
    translate([bb_hole/2,wy,0])
        cylinder(d=3.2,h=5,center=false);

    translate([-bb_hole/2,wy,0])
        cylinder(d=3.2,h=5,center=false);
    
    translate([0,-10+bb_cut,5])
        cube([cc_y,10,10],center=true);
    
}

module F4gtotal()
{
    difference()
    {
        base_bar();
        cut_outs();
    }
    
}
F4gtotal();
